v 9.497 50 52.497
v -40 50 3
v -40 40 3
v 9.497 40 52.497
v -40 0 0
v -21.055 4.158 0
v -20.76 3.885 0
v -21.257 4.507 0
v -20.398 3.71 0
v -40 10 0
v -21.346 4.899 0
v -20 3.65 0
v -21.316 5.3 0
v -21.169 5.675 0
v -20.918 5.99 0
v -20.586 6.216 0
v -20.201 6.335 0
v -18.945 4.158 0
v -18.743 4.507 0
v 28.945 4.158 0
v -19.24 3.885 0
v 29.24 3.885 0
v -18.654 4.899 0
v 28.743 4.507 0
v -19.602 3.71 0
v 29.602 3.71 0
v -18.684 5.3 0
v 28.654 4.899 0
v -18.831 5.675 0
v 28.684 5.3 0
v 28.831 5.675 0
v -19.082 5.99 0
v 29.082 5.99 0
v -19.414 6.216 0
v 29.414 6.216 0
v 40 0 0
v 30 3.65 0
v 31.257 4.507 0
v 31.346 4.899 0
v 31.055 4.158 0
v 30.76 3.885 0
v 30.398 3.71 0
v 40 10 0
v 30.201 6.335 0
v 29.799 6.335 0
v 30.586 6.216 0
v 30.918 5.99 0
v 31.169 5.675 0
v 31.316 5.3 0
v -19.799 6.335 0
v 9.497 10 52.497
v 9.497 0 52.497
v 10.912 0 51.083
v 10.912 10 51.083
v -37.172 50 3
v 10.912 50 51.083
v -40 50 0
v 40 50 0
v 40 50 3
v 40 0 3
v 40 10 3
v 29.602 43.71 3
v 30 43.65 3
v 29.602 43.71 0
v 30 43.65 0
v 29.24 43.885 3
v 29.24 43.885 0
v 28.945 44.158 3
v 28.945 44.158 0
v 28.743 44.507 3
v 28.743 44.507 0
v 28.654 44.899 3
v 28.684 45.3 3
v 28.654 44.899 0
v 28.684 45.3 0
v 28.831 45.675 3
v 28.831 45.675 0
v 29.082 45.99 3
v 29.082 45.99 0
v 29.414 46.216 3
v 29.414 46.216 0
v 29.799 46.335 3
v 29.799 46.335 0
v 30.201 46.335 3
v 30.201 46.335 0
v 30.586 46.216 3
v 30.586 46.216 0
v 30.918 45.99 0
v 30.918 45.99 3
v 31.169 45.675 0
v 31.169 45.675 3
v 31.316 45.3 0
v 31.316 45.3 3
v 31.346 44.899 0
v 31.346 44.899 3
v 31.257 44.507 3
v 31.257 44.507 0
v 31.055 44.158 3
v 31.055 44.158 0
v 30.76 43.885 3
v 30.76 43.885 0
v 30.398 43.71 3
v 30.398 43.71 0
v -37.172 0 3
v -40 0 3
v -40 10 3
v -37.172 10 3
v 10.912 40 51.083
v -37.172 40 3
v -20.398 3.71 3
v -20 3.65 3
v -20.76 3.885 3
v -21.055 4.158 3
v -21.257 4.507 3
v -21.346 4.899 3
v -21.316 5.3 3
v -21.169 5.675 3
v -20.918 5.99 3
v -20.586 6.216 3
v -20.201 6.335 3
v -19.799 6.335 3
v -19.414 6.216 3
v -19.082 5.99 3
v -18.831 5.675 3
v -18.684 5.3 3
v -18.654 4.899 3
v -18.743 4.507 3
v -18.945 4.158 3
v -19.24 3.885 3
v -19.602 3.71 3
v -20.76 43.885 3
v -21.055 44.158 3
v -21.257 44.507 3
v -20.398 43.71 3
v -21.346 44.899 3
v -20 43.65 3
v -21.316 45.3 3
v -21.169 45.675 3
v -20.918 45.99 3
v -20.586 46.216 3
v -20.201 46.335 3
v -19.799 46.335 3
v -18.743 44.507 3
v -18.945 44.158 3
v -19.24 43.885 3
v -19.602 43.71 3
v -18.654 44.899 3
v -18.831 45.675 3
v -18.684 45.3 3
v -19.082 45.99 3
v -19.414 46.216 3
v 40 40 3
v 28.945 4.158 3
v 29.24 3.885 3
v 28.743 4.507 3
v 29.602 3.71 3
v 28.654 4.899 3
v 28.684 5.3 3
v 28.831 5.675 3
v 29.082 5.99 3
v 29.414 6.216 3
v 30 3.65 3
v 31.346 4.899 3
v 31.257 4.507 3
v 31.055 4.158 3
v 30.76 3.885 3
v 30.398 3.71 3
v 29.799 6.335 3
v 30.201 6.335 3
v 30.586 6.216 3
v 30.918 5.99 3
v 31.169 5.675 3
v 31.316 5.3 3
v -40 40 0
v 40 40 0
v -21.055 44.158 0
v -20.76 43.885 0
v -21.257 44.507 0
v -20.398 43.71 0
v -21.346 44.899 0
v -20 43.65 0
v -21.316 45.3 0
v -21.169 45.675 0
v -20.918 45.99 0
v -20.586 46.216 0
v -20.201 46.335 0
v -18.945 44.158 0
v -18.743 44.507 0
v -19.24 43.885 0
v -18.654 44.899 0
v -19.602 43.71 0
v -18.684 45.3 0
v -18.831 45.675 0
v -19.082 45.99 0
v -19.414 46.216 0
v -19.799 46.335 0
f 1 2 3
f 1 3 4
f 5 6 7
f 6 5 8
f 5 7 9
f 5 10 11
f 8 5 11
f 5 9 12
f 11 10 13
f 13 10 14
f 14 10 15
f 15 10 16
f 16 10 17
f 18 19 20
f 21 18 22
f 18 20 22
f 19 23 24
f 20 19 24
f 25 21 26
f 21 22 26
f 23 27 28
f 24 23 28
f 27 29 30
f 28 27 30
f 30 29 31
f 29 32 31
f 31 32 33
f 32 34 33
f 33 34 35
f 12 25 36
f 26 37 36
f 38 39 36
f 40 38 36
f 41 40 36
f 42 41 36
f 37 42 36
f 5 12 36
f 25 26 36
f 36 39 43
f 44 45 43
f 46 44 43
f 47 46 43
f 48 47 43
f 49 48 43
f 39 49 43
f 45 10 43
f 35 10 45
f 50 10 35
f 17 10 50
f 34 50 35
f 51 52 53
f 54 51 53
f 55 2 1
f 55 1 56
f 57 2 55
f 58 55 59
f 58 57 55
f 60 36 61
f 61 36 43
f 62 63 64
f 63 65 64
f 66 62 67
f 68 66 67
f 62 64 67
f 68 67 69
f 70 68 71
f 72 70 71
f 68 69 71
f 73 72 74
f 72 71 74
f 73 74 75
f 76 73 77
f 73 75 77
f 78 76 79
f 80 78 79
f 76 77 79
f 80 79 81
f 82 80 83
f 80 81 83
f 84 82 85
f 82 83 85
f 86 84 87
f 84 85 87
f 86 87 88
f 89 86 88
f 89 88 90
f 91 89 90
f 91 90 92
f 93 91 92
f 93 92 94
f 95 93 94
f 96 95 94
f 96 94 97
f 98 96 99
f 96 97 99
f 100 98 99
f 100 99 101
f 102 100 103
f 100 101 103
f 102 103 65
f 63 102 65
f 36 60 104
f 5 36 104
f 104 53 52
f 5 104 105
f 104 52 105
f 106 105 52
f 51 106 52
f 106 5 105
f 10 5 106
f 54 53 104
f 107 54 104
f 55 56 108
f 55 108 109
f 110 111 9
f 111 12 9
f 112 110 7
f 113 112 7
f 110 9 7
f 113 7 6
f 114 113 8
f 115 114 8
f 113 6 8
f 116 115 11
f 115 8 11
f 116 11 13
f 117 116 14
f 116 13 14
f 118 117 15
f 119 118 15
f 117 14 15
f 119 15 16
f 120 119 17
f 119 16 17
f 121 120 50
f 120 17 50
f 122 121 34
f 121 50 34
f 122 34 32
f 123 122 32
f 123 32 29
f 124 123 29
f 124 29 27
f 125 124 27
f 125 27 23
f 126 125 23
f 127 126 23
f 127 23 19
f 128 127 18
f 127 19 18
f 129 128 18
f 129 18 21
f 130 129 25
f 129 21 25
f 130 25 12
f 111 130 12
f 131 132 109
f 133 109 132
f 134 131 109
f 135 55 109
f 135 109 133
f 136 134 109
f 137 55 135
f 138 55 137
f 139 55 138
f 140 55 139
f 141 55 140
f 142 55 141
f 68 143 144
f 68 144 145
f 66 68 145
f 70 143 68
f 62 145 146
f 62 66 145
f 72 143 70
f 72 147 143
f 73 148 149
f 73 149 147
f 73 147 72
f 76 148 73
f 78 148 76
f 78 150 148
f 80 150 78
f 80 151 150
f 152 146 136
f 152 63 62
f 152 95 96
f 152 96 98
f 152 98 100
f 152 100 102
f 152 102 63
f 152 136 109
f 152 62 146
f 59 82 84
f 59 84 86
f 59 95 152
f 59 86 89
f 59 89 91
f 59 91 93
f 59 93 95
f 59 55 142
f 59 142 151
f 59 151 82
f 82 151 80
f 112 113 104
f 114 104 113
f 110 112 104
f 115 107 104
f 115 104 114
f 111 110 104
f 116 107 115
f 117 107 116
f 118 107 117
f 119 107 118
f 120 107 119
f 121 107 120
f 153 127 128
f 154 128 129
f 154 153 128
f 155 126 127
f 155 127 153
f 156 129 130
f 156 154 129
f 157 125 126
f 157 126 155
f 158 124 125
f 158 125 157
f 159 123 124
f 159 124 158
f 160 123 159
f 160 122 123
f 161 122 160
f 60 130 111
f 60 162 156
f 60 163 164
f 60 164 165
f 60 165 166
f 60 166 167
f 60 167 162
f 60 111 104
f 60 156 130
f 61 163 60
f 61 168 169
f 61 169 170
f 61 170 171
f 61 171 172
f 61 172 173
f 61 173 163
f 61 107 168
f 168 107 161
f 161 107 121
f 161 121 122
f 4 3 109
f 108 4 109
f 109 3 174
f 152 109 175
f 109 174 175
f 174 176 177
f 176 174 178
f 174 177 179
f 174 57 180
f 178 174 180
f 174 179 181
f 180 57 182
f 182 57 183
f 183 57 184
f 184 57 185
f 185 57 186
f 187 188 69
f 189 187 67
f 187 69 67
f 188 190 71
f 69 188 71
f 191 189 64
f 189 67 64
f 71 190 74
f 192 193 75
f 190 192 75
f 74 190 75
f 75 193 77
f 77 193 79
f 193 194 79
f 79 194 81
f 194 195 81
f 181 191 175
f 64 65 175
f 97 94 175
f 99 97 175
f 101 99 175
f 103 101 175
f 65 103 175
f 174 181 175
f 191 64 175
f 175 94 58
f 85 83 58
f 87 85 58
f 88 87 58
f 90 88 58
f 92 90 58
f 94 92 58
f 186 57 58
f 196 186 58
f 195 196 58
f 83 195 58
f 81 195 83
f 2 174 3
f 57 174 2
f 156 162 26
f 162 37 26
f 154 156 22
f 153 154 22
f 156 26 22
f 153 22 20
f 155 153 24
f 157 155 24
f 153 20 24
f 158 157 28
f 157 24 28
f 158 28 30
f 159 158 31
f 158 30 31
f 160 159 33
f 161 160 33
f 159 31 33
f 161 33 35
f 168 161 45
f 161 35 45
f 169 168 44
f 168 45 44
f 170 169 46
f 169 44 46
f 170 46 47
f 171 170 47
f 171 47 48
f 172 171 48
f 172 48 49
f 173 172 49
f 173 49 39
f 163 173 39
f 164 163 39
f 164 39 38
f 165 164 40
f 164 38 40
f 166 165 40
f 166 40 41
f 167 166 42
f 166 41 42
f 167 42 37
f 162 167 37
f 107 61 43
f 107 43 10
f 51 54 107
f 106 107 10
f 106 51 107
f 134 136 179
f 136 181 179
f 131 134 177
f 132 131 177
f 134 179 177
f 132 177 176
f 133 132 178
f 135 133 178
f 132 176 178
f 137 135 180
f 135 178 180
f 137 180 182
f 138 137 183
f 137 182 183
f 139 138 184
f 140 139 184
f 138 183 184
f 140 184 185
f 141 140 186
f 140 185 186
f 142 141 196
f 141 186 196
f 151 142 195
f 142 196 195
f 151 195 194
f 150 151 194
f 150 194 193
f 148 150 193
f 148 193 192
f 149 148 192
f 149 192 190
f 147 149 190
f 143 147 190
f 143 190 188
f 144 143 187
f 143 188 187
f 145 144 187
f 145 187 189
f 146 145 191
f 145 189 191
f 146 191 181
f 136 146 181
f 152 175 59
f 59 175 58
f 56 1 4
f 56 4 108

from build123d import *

# Parameters (mm, degrees)
CROQUIS1_W                              = 80
CROQUIS1_H                              = 10
SALIENTE_EXTRUIR1_DEPTH                 = 3
SALIENTE_EXTRUIR1_2_DEPTH               = 3
SALIENTE_EXTRUIR2_DEPTH                 = 10
SALIENTE_EXTRUIR3_DEPTH                 = 10
CROQUIS8_W                              = 1.35
CROQUIS8_H                              = 3
TALADRO_DE_MARGEN_PARA_M2_52_AT_2_COUNT = 2
TALADRO_DE_MARGEN_PARA_M2_52_AT_2_PITCH = 50
TALADRO_DE_MARGEN_PARA_M2_52_AT_3_COUNT = 2
TALADRO_DE_MARGEN_PARA_M2_52_AT_3_PITCH = 64.031242374
TALADRO_DE_MARGEN_PARA_M2_52_AT_4_COUNT = 2
TALADRO_DE_MARGEN_PARA_M2_52_AT_4_PITCH = 40


with BuildPart() as part:
    # Croquis1 → Saliente-Extruir1 (new body)
    with BuildSketch(Plane.XY):
        with Locations((0, 45)):
            Rectangle(CROQUIS1_W, CROQUIS1_H)
    extrude(amount=SALIENTE_EXTRUIR1_DEPTH)

    # Croquis3 → Saliente-Extruir3 (add)
    with BuildSketch(Plane(origin=(0, 50, 0), x_dir=(1, 0, 0), z_dir=(0, 1, 0))):
        Polygon((-40, -3), (9.497474683, -52.497474683), (10.911688245, -51.083261121), (-37.171572875, -3), align=None)
    extrude(amount=-SALIENTE_EXTRUIR3_DEPTH)

    # Croquis8 → Taladro de margen para M2.52 (revolve, cut)
    with BuildSketch(Plane(origin=(-20, 45, 3), x_dir=(0, -1, 0), z_dir=(1, 0, 0))):
        with Locations((0.675, 1.5)):
            Rectangle(CROQUIS8_W, CROQUIS8_H)
    taladro_de_margen_para_m2_52 = revolve(axis=Axis((-20, 45, 9.35), (0, 0, -1)), mode=Mode.SUBTRACT)

    # Taladro de margen para M2.52 at 2: Taladro de margen para M2.52 ×2
    with Locations(*[(i * TALADRO_DE_MARGEN_PARA_M2_52_AT_2_PITCH, 0, 0) for i in range(1, TALADRO_DE_MARGEN_PARA_M2_52_AT_2_COUNT)]):
        add(taladro_de_margen_para_m2_52, mode=Mode.SUBTRACT)


with BuildPart() as body_2:
    # Croquis1 → Saliente-Extruir1 2 (new body)
    with BuildSketch(Plane.XY):
        with Locations((0, 5)):
            Rectangle(CROQUIS1_W, CROQUIS1_H)
    extrude(amount=SALIENTE_EXTRUIR1_2_DEPTH)

    # Croquis2 → Saliente-Extruir2 (add)
    with BuildSketch(Plane.XZ):
        Polygon((-40, 3), (9.497474683, 52.497474683), (10.911688245, 51.083261121), (-37.171572875, 3), align=None)
    extrude(amount=-SALIENTE_EXTRUIR2_DEPTH)

    # Taladro de margen para M2.52 at 3: Taladro de margen para M2.52 ×2
    with Locations(*[Vector(0.7808688094430303, -0.6246950475544244, 0) * (i * TALADRO_DE_MARGEN_PARA_M2_52_AT_3_PITCH) for i in range(1, TALADRO_DE_MARGEN_PARA_M2_52_AT_3_COUNT)]):
        add(taladro_de_margen_para_m2_52, mode=Mode.SUBTRACT)

    # Taladro de margen para M2.52 at 4: Taladro de margen para M2.52 ×2
    with Locations(*[(0, -i * TALADRO_DE_MARGEN_PARA_M2_52_AT_4_PITCH, 0) for i in range(1, TALADRO_DE_MARGEN_PARA_M2_52_AT_4_COUNT)]):
        add(taladro_de_margen_para_m2_52, mode=Mode.SUBTRACT)


solid = Compound([part.part, body_2.part])
